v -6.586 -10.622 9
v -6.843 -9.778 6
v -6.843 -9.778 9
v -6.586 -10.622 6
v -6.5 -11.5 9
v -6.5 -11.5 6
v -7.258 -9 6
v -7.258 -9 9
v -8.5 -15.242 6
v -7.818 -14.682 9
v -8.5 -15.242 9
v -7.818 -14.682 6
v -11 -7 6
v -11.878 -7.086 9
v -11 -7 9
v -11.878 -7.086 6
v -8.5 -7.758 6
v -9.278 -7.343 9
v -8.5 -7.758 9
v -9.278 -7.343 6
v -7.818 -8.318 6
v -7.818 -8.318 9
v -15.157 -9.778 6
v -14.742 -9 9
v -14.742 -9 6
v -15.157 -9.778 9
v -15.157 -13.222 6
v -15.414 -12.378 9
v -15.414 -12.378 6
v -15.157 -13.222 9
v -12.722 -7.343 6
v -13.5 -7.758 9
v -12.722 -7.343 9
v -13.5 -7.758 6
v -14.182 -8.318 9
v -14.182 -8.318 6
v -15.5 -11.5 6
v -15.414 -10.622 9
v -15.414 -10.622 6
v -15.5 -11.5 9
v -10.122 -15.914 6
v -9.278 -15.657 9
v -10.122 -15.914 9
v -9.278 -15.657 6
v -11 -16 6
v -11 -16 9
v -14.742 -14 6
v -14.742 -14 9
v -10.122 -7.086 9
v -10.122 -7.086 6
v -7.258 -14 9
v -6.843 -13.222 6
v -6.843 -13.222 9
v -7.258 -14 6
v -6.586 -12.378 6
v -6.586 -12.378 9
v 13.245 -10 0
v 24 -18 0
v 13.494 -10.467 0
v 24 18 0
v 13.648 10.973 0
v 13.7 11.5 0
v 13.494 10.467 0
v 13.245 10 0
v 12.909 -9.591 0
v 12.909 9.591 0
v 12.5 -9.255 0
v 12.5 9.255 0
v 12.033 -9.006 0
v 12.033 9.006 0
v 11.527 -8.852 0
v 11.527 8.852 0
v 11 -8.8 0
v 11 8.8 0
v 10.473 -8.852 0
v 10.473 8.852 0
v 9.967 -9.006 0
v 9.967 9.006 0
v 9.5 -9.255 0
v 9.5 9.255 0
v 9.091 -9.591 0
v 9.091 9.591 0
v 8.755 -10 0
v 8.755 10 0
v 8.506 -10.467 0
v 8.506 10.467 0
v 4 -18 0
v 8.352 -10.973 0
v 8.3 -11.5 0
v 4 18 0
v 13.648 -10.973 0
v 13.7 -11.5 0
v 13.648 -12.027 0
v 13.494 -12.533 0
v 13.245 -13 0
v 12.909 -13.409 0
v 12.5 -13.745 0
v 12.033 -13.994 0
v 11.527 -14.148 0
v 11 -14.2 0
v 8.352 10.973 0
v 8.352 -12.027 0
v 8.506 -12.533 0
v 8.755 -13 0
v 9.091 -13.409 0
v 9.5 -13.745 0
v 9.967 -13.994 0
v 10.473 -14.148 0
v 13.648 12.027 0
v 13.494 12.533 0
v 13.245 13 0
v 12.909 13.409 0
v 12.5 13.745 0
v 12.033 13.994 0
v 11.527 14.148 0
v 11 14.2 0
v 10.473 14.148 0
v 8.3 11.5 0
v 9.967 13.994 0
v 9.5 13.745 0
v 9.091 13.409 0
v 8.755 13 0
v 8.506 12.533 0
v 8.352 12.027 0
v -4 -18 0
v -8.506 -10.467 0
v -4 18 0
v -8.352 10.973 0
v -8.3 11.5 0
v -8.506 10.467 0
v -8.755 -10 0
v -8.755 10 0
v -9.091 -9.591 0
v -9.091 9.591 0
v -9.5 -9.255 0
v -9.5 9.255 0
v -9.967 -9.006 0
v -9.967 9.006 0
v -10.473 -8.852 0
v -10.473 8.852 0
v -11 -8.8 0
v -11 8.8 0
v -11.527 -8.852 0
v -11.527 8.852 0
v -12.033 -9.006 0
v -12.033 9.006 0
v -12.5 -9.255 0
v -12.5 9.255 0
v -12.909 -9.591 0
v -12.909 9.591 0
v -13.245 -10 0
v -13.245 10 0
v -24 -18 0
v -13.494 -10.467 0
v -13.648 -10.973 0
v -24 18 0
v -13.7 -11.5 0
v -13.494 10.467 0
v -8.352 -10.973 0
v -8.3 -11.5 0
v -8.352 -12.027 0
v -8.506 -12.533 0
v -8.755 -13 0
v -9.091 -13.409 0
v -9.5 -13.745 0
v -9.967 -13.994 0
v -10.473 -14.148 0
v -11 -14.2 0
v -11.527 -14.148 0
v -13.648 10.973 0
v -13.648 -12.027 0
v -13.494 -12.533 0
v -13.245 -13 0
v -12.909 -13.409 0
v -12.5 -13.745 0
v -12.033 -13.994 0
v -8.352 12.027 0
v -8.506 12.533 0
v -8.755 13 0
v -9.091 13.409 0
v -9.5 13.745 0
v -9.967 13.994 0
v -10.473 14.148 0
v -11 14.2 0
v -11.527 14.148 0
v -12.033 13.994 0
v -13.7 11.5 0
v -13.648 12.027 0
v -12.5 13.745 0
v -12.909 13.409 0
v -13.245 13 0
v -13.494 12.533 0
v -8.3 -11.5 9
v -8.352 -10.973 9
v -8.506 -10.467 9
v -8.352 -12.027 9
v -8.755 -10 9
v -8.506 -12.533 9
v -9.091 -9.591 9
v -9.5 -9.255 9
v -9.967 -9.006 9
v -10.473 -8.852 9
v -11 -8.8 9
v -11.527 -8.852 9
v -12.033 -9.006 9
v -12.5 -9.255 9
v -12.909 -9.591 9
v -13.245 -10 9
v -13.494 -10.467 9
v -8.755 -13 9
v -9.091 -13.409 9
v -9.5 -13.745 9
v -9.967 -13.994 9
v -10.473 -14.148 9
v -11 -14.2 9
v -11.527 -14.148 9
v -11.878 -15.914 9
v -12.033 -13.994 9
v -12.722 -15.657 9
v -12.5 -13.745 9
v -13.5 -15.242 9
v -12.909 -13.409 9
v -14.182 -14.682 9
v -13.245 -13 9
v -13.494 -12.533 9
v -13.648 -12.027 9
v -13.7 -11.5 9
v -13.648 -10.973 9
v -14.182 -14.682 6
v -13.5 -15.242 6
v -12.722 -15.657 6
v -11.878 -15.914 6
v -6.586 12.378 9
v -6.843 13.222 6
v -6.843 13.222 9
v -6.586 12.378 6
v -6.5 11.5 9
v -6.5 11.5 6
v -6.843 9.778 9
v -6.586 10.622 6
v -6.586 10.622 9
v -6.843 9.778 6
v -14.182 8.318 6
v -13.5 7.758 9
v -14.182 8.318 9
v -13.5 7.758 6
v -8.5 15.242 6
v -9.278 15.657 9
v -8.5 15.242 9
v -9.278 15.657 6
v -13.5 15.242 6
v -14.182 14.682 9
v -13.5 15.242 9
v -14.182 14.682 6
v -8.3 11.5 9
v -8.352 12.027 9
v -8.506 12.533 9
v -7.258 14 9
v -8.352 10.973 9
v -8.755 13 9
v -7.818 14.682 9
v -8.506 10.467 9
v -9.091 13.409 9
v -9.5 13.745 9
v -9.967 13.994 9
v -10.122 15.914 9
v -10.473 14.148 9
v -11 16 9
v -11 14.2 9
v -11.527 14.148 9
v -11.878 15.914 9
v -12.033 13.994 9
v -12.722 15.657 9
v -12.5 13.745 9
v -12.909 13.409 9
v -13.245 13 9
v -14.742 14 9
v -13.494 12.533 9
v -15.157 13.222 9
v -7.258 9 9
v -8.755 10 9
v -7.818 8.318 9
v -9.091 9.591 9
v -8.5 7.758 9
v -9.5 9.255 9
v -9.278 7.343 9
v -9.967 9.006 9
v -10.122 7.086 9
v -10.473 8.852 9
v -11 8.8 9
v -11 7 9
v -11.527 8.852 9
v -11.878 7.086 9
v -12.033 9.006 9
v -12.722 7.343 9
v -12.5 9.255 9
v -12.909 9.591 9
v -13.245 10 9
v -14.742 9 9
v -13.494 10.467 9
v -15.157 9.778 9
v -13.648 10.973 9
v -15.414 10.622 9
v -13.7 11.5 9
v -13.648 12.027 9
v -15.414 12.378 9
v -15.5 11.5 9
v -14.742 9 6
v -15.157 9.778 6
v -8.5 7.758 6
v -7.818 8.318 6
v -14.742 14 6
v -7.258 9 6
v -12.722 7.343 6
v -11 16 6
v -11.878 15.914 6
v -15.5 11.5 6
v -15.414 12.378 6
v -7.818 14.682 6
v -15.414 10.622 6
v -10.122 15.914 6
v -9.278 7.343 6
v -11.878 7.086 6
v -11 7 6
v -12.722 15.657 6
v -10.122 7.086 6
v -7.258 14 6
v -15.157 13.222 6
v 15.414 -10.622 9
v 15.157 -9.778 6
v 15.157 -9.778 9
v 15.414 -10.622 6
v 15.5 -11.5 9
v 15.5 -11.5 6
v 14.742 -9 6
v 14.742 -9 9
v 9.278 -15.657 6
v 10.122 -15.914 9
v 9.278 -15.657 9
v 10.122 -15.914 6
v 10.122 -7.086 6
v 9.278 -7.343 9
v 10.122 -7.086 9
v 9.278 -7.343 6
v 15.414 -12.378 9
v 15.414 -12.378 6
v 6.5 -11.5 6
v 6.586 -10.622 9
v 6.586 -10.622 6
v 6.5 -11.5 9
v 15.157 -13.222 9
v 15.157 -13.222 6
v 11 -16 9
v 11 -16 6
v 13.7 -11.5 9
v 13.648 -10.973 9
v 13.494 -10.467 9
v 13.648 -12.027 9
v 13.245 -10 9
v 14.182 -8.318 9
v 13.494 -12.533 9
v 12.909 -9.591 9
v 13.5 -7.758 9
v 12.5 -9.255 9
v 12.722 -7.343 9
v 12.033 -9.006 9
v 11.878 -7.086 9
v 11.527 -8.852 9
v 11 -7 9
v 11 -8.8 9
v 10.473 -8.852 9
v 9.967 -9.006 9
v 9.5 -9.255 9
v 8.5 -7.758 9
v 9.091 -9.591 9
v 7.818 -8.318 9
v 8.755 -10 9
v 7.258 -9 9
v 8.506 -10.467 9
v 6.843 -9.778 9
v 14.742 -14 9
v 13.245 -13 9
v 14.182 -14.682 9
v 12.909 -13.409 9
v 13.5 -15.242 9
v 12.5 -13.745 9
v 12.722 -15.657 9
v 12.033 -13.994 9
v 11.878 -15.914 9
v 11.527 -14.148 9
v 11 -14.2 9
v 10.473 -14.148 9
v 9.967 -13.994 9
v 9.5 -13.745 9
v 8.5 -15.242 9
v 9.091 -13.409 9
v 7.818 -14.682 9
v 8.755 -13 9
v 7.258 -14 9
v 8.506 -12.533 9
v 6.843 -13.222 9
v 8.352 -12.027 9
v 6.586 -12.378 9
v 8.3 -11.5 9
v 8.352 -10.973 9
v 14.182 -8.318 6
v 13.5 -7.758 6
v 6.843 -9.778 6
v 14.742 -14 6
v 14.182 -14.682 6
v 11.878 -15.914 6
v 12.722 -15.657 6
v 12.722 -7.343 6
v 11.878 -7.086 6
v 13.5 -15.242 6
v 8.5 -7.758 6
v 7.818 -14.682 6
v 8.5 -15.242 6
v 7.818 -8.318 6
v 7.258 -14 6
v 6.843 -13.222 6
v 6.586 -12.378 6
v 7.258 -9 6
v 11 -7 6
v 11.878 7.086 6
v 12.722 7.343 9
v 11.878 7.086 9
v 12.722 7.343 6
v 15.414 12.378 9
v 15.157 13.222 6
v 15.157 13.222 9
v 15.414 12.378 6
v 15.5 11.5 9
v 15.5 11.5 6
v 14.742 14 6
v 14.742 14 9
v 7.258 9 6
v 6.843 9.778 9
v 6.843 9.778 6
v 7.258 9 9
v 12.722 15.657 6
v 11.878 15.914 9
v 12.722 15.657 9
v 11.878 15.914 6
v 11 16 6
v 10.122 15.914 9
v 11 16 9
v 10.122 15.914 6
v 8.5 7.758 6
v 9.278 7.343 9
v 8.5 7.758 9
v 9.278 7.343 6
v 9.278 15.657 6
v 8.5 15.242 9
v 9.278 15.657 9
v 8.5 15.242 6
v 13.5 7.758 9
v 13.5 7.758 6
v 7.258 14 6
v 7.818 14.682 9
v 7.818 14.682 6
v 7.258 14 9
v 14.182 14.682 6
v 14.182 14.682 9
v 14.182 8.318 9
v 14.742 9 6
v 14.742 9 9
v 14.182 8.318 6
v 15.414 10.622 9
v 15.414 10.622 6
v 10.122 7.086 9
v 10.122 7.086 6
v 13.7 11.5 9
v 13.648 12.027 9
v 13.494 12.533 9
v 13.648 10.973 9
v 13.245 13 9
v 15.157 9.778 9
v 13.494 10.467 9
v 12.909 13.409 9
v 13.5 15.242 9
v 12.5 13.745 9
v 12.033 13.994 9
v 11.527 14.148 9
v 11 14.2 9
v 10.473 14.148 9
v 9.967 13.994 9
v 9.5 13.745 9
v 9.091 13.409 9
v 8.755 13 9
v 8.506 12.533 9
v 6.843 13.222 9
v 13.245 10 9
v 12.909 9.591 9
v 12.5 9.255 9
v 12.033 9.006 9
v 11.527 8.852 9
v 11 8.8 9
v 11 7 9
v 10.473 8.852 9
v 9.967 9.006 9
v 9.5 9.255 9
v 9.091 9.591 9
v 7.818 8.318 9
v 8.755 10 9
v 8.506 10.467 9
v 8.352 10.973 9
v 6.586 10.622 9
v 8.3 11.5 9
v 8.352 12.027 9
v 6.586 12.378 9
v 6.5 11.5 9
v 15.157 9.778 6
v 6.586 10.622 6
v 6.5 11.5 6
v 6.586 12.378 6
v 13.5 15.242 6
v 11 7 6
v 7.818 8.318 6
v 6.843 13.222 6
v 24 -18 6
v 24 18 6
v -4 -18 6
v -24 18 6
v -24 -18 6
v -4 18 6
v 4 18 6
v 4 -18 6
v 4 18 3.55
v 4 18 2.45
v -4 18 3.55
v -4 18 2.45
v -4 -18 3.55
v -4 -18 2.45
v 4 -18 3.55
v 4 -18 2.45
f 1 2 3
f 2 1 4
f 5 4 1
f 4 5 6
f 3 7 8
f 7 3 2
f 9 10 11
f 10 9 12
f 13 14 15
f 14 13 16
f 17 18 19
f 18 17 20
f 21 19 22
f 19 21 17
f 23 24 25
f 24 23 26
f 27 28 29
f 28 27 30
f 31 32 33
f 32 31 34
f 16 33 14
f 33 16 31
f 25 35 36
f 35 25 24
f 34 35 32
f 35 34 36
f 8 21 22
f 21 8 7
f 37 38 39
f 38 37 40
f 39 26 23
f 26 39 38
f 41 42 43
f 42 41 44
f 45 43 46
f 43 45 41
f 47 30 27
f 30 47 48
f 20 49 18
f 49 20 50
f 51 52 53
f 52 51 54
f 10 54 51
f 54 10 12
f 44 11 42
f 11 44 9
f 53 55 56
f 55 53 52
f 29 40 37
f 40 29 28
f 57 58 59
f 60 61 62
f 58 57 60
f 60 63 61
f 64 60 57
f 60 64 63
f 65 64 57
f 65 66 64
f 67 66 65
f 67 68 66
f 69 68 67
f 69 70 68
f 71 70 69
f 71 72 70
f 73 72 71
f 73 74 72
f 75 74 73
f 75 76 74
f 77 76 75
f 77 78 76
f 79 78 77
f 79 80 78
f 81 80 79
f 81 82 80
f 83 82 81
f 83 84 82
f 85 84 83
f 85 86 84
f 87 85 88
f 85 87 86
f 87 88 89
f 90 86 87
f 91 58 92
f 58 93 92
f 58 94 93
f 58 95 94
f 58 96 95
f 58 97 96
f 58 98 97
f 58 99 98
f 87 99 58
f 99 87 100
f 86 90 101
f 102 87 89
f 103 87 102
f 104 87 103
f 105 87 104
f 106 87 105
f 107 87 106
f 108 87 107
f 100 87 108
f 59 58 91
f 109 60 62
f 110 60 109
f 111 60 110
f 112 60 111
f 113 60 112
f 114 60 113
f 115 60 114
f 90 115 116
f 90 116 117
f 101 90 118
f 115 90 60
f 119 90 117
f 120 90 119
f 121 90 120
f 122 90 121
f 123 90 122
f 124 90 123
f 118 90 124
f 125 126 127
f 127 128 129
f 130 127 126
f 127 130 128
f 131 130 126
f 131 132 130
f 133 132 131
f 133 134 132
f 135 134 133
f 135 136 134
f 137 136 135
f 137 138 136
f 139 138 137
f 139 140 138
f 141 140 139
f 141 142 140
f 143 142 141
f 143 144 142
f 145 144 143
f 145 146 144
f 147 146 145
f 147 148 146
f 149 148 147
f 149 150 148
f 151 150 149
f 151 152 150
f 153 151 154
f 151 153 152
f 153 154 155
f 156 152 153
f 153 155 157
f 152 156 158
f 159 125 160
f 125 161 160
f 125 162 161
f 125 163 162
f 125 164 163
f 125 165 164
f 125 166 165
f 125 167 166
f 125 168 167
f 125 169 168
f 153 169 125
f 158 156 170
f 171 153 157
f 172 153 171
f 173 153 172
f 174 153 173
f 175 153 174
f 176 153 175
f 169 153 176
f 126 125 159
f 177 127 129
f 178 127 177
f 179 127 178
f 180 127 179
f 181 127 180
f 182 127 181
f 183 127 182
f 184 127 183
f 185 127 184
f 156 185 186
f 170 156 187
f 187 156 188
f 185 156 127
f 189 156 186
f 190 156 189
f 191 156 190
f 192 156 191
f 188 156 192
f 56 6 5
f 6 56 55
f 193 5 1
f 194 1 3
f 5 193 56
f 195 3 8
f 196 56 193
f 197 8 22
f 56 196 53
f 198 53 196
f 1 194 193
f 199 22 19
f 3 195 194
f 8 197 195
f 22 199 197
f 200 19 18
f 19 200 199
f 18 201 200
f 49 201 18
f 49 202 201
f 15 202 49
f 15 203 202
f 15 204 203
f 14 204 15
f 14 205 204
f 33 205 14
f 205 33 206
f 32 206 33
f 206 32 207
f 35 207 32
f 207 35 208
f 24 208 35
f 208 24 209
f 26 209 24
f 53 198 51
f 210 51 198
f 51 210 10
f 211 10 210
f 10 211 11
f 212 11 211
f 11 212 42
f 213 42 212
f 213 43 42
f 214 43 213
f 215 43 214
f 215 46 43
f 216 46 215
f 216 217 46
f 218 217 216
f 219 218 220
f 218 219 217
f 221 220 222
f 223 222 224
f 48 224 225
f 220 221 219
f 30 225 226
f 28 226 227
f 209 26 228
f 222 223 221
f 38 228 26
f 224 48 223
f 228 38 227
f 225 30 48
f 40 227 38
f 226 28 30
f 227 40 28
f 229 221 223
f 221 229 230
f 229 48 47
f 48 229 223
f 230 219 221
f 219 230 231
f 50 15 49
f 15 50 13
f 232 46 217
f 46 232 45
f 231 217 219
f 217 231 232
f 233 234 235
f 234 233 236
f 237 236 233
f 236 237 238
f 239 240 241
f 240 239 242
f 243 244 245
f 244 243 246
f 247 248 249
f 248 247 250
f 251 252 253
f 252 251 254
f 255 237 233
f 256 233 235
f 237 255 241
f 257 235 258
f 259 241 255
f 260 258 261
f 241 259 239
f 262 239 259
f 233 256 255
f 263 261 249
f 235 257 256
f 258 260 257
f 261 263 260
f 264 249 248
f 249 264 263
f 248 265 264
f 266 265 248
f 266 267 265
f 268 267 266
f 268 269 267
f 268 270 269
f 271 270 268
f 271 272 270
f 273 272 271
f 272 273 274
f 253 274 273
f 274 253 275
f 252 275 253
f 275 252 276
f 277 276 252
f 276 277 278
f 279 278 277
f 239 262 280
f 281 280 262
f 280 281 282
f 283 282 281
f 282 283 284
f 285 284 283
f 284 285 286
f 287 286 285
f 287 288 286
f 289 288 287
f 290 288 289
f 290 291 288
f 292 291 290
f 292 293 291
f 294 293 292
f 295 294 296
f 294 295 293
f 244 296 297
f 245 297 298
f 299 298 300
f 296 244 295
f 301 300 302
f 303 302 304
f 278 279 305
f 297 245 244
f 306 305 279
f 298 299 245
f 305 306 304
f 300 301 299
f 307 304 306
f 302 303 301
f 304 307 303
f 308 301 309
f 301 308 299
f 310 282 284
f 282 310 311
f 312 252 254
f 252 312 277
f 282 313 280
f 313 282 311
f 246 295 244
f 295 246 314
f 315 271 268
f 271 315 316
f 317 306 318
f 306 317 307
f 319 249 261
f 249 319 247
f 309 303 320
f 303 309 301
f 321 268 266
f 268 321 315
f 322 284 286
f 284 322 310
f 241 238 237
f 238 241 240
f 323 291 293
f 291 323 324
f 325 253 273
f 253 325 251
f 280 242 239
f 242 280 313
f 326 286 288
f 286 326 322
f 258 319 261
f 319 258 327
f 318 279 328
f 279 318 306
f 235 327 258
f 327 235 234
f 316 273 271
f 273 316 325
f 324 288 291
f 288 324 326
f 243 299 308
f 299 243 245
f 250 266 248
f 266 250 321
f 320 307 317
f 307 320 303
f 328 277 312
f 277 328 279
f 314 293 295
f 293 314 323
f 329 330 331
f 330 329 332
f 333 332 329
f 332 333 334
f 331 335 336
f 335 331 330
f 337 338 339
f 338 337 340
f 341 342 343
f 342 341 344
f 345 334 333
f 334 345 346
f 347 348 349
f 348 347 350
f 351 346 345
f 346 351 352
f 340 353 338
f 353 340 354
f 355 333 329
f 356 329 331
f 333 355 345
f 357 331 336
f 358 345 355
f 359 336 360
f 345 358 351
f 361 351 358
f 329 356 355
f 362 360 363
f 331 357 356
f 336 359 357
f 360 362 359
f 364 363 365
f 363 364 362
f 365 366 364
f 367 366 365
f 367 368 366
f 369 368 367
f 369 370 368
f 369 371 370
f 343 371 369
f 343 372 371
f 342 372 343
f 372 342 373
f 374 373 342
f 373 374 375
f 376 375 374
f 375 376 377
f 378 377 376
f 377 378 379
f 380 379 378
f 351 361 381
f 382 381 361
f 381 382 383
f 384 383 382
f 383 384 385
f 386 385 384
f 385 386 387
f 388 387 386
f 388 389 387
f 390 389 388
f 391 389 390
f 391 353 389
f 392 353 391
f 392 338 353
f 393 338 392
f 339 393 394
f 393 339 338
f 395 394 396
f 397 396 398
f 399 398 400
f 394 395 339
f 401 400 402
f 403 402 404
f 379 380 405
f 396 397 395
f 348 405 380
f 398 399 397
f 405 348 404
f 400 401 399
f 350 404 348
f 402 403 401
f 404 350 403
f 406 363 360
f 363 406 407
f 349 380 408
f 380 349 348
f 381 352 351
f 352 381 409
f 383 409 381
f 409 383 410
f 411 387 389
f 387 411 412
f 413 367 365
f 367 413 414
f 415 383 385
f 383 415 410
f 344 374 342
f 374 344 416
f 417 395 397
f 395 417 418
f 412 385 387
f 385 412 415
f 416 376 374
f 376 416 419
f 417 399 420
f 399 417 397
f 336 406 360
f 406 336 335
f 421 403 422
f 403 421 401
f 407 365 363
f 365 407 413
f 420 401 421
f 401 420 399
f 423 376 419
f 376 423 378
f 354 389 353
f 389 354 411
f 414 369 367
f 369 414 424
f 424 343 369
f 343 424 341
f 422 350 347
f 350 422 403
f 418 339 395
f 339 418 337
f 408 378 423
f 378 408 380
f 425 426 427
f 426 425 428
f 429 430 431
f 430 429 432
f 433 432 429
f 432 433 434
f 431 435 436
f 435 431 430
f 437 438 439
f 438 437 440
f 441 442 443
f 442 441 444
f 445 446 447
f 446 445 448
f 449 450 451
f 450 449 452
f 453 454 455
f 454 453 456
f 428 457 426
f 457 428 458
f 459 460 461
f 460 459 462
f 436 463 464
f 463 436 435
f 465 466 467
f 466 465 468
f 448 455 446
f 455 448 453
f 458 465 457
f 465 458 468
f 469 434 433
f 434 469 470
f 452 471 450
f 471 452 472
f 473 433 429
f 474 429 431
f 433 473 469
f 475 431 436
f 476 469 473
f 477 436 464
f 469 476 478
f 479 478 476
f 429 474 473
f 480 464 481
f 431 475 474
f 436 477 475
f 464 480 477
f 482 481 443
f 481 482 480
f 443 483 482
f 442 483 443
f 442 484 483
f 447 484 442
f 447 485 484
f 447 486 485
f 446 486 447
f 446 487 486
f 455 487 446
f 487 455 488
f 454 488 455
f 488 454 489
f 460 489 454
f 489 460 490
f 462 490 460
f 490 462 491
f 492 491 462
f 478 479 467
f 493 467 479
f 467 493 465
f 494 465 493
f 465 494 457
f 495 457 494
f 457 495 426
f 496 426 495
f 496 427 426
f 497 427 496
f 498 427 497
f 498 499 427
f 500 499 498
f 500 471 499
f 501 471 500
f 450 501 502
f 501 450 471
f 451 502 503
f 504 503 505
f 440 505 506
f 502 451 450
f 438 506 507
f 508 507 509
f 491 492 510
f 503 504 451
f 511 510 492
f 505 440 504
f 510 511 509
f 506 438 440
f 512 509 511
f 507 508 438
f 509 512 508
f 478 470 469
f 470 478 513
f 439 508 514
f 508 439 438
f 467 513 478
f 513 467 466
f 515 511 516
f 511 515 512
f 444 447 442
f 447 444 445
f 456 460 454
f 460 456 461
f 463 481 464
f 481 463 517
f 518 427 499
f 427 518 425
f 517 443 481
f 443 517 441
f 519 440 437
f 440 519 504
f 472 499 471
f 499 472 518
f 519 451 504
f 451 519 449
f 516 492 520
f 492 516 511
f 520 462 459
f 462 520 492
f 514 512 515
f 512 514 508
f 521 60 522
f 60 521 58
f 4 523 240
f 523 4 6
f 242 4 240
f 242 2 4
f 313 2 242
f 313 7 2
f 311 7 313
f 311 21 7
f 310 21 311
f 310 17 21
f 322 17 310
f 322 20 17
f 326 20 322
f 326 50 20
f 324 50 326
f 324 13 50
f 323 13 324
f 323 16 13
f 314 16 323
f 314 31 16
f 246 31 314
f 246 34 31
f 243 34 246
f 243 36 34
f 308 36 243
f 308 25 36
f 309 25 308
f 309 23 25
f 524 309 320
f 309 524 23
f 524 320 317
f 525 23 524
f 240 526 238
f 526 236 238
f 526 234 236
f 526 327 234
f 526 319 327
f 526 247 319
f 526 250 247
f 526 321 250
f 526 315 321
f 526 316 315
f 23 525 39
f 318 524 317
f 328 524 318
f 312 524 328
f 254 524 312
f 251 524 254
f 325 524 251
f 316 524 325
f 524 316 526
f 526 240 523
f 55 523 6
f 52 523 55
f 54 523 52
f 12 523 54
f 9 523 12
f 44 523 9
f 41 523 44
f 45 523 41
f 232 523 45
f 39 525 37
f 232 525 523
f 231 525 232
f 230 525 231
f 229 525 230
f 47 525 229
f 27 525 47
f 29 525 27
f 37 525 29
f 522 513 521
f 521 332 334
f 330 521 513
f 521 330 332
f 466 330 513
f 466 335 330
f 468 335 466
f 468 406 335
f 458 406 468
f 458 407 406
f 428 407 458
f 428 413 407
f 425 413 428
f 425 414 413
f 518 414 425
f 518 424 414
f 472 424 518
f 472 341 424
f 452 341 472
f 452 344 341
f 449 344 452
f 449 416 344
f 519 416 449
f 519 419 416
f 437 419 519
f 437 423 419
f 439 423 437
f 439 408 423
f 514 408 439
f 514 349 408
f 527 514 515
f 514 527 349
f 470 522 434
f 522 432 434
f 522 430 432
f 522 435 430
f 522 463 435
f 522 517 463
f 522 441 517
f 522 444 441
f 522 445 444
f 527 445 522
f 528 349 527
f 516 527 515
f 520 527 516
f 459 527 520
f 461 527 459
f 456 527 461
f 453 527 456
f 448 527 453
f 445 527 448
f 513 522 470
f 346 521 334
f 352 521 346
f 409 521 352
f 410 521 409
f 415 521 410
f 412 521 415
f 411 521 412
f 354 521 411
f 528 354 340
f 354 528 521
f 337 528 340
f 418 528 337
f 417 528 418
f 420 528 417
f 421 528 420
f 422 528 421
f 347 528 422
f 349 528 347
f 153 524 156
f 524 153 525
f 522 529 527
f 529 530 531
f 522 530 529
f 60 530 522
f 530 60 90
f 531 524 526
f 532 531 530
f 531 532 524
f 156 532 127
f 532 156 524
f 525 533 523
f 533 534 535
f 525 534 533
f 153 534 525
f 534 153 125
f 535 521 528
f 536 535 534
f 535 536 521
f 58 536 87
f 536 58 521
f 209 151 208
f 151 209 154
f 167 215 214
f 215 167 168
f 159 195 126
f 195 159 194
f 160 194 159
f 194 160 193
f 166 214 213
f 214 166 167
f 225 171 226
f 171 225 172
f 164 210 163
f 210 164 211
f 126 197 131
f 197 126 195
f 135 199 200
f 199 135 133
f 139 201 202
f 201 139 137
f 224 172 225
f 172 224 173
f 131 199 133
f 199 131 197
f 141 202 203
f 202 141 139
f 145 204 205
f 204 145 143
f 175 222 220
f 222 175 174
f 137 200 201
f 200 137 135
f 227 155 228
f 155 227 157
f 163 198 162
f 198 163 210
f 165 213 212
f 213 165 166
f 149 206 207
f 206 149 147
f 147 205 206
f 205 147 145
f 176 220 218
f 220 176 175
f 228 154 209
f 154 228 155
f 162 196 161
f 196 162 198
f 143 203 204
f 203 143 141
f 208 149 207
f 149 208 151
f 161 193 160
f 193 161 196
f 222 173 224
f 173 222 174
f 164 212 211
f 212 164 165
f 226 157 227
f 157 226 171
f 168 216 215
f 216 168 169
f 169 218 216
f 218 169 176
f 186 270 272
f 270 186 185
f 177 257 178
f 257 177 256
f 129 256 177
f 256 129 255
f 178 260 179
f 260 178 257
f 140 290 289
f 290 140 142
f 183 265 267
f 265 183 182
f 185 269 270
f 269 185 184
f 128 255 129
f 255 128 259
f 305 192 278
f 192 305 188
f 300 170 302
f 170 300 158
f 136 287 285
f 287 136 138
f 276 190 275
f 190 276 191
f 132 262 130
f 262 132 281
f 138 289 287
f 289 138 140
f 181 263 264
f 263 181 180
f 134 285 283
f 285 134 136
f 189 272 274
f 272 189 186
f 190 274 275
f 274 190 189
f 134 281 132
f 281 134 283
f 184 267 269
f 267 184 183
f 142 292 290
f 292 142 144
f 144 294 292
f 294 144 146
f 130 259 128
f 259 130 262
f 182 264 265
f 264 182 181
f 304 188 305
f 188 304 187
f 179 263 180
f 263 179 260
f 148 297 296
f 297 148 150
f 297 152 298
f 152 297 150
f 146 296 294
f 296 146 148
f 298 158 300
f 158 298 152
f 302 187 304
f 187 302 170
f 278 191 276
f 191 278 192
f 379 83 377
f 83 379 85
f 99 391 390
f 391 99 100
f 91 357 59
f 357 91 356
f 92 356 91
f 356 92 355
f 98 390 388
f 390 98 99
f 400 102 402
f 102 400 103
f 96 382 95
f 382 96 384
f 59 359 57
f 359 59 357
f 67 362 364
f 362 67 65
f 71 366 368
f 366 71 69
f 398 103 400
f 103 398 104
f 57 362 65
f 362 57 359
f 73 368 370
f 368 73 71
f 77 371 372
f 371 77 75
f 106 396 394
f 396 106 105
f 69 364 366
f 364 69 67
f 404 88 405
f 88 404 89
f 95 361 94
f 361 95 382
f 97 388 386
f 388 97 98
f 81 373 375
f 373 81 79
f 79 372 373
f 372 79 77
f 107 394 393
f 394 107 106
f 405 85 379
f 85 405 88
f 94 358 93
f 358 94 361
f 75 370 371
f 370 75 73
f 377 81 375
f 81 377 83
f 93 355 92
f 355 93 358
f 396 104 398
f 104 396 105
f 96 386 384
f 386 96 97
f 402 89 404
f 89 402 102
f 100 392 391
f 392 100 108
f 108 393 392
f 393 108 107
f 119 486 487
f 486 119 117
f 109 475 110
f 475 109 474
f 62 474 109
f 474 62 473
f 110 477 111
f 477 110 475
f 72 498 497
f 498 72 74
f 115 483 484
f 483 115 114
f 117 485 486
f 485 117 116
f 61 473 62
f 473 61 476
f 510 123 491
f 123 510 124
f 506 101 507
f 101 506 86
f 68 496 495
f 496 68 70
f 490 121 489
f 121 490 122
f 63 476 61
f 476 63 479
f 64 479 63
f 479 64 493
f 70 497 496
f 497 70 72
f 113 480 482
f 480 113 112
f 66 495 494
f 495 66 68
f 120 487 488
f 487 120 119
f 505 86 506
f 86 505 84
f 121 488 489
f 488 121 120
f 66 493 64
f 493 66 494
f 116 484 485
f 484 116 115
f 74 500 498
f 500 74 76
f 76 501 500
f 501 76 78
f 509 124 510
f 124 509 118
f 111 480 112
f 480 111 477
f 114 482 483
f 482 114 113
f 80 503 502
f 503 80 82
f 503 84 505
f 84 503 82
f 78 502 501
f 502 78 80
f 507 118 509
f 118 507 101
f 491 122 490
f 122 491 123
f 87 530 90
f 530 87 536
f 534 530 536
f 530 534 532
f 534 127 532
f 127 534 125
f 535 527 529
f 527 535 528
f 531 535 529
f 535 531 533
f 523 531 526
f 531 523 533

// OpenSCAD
$fn = 32;

// ----------------------------------------------------------------------
// Living hinge: 48 x 36 mm plates, 1.1 mm flexible web
// ----------------------------------------------------------------------

// --- parameters (mm) ---
plate_len = 20;           // plate length outside the web
plate_w = 36;             // plate width
thick = 6;                // plate thickness
web_half = 4;             // half width of the flex band
web_t = 1.1;              // flexible web thickness
web_z = 2.45;             // web position inside the thickness
boss_d = 9;               // screw boss diameter
boss_h = 9;               // screw boss height
boss_x = 11;              // screw boss distance from the web
screw_d = 5.4;            // screw hole

difference() {
  union() {
    /* one flat strip, later thinned at the middle */
    translate([-24, -18, 0]) cube([48, 36, 6]);
    /* screw bosses, sunk 0.5 mm into the plates */
    for (sx = [-11, 11]) {
      for (sy = [-11.5, 11.5]) {
        translate([sx, sy, 0]) cylinder(h = boss_h, d = boss_d);
      }
    }
  }
  /* channel from below: leaves the web on top of it */
  translate([-4, -20.5, -2.5]) cube([8, 41, 4.95]);
  /* channel from above: thins the web down to web_t */
  translate([-4, -20.5, 3.55]) cube([8, 41, 4.95]);
  /* screw holes through the bosses */
  for (sx = [-11, 11]) {
    for (sy = [-11.5, 11.5]) {
      translate([sx, sy, -2.5]) cylinder(h = boss_h + 5, d = screw_d);
    }
  }
}
